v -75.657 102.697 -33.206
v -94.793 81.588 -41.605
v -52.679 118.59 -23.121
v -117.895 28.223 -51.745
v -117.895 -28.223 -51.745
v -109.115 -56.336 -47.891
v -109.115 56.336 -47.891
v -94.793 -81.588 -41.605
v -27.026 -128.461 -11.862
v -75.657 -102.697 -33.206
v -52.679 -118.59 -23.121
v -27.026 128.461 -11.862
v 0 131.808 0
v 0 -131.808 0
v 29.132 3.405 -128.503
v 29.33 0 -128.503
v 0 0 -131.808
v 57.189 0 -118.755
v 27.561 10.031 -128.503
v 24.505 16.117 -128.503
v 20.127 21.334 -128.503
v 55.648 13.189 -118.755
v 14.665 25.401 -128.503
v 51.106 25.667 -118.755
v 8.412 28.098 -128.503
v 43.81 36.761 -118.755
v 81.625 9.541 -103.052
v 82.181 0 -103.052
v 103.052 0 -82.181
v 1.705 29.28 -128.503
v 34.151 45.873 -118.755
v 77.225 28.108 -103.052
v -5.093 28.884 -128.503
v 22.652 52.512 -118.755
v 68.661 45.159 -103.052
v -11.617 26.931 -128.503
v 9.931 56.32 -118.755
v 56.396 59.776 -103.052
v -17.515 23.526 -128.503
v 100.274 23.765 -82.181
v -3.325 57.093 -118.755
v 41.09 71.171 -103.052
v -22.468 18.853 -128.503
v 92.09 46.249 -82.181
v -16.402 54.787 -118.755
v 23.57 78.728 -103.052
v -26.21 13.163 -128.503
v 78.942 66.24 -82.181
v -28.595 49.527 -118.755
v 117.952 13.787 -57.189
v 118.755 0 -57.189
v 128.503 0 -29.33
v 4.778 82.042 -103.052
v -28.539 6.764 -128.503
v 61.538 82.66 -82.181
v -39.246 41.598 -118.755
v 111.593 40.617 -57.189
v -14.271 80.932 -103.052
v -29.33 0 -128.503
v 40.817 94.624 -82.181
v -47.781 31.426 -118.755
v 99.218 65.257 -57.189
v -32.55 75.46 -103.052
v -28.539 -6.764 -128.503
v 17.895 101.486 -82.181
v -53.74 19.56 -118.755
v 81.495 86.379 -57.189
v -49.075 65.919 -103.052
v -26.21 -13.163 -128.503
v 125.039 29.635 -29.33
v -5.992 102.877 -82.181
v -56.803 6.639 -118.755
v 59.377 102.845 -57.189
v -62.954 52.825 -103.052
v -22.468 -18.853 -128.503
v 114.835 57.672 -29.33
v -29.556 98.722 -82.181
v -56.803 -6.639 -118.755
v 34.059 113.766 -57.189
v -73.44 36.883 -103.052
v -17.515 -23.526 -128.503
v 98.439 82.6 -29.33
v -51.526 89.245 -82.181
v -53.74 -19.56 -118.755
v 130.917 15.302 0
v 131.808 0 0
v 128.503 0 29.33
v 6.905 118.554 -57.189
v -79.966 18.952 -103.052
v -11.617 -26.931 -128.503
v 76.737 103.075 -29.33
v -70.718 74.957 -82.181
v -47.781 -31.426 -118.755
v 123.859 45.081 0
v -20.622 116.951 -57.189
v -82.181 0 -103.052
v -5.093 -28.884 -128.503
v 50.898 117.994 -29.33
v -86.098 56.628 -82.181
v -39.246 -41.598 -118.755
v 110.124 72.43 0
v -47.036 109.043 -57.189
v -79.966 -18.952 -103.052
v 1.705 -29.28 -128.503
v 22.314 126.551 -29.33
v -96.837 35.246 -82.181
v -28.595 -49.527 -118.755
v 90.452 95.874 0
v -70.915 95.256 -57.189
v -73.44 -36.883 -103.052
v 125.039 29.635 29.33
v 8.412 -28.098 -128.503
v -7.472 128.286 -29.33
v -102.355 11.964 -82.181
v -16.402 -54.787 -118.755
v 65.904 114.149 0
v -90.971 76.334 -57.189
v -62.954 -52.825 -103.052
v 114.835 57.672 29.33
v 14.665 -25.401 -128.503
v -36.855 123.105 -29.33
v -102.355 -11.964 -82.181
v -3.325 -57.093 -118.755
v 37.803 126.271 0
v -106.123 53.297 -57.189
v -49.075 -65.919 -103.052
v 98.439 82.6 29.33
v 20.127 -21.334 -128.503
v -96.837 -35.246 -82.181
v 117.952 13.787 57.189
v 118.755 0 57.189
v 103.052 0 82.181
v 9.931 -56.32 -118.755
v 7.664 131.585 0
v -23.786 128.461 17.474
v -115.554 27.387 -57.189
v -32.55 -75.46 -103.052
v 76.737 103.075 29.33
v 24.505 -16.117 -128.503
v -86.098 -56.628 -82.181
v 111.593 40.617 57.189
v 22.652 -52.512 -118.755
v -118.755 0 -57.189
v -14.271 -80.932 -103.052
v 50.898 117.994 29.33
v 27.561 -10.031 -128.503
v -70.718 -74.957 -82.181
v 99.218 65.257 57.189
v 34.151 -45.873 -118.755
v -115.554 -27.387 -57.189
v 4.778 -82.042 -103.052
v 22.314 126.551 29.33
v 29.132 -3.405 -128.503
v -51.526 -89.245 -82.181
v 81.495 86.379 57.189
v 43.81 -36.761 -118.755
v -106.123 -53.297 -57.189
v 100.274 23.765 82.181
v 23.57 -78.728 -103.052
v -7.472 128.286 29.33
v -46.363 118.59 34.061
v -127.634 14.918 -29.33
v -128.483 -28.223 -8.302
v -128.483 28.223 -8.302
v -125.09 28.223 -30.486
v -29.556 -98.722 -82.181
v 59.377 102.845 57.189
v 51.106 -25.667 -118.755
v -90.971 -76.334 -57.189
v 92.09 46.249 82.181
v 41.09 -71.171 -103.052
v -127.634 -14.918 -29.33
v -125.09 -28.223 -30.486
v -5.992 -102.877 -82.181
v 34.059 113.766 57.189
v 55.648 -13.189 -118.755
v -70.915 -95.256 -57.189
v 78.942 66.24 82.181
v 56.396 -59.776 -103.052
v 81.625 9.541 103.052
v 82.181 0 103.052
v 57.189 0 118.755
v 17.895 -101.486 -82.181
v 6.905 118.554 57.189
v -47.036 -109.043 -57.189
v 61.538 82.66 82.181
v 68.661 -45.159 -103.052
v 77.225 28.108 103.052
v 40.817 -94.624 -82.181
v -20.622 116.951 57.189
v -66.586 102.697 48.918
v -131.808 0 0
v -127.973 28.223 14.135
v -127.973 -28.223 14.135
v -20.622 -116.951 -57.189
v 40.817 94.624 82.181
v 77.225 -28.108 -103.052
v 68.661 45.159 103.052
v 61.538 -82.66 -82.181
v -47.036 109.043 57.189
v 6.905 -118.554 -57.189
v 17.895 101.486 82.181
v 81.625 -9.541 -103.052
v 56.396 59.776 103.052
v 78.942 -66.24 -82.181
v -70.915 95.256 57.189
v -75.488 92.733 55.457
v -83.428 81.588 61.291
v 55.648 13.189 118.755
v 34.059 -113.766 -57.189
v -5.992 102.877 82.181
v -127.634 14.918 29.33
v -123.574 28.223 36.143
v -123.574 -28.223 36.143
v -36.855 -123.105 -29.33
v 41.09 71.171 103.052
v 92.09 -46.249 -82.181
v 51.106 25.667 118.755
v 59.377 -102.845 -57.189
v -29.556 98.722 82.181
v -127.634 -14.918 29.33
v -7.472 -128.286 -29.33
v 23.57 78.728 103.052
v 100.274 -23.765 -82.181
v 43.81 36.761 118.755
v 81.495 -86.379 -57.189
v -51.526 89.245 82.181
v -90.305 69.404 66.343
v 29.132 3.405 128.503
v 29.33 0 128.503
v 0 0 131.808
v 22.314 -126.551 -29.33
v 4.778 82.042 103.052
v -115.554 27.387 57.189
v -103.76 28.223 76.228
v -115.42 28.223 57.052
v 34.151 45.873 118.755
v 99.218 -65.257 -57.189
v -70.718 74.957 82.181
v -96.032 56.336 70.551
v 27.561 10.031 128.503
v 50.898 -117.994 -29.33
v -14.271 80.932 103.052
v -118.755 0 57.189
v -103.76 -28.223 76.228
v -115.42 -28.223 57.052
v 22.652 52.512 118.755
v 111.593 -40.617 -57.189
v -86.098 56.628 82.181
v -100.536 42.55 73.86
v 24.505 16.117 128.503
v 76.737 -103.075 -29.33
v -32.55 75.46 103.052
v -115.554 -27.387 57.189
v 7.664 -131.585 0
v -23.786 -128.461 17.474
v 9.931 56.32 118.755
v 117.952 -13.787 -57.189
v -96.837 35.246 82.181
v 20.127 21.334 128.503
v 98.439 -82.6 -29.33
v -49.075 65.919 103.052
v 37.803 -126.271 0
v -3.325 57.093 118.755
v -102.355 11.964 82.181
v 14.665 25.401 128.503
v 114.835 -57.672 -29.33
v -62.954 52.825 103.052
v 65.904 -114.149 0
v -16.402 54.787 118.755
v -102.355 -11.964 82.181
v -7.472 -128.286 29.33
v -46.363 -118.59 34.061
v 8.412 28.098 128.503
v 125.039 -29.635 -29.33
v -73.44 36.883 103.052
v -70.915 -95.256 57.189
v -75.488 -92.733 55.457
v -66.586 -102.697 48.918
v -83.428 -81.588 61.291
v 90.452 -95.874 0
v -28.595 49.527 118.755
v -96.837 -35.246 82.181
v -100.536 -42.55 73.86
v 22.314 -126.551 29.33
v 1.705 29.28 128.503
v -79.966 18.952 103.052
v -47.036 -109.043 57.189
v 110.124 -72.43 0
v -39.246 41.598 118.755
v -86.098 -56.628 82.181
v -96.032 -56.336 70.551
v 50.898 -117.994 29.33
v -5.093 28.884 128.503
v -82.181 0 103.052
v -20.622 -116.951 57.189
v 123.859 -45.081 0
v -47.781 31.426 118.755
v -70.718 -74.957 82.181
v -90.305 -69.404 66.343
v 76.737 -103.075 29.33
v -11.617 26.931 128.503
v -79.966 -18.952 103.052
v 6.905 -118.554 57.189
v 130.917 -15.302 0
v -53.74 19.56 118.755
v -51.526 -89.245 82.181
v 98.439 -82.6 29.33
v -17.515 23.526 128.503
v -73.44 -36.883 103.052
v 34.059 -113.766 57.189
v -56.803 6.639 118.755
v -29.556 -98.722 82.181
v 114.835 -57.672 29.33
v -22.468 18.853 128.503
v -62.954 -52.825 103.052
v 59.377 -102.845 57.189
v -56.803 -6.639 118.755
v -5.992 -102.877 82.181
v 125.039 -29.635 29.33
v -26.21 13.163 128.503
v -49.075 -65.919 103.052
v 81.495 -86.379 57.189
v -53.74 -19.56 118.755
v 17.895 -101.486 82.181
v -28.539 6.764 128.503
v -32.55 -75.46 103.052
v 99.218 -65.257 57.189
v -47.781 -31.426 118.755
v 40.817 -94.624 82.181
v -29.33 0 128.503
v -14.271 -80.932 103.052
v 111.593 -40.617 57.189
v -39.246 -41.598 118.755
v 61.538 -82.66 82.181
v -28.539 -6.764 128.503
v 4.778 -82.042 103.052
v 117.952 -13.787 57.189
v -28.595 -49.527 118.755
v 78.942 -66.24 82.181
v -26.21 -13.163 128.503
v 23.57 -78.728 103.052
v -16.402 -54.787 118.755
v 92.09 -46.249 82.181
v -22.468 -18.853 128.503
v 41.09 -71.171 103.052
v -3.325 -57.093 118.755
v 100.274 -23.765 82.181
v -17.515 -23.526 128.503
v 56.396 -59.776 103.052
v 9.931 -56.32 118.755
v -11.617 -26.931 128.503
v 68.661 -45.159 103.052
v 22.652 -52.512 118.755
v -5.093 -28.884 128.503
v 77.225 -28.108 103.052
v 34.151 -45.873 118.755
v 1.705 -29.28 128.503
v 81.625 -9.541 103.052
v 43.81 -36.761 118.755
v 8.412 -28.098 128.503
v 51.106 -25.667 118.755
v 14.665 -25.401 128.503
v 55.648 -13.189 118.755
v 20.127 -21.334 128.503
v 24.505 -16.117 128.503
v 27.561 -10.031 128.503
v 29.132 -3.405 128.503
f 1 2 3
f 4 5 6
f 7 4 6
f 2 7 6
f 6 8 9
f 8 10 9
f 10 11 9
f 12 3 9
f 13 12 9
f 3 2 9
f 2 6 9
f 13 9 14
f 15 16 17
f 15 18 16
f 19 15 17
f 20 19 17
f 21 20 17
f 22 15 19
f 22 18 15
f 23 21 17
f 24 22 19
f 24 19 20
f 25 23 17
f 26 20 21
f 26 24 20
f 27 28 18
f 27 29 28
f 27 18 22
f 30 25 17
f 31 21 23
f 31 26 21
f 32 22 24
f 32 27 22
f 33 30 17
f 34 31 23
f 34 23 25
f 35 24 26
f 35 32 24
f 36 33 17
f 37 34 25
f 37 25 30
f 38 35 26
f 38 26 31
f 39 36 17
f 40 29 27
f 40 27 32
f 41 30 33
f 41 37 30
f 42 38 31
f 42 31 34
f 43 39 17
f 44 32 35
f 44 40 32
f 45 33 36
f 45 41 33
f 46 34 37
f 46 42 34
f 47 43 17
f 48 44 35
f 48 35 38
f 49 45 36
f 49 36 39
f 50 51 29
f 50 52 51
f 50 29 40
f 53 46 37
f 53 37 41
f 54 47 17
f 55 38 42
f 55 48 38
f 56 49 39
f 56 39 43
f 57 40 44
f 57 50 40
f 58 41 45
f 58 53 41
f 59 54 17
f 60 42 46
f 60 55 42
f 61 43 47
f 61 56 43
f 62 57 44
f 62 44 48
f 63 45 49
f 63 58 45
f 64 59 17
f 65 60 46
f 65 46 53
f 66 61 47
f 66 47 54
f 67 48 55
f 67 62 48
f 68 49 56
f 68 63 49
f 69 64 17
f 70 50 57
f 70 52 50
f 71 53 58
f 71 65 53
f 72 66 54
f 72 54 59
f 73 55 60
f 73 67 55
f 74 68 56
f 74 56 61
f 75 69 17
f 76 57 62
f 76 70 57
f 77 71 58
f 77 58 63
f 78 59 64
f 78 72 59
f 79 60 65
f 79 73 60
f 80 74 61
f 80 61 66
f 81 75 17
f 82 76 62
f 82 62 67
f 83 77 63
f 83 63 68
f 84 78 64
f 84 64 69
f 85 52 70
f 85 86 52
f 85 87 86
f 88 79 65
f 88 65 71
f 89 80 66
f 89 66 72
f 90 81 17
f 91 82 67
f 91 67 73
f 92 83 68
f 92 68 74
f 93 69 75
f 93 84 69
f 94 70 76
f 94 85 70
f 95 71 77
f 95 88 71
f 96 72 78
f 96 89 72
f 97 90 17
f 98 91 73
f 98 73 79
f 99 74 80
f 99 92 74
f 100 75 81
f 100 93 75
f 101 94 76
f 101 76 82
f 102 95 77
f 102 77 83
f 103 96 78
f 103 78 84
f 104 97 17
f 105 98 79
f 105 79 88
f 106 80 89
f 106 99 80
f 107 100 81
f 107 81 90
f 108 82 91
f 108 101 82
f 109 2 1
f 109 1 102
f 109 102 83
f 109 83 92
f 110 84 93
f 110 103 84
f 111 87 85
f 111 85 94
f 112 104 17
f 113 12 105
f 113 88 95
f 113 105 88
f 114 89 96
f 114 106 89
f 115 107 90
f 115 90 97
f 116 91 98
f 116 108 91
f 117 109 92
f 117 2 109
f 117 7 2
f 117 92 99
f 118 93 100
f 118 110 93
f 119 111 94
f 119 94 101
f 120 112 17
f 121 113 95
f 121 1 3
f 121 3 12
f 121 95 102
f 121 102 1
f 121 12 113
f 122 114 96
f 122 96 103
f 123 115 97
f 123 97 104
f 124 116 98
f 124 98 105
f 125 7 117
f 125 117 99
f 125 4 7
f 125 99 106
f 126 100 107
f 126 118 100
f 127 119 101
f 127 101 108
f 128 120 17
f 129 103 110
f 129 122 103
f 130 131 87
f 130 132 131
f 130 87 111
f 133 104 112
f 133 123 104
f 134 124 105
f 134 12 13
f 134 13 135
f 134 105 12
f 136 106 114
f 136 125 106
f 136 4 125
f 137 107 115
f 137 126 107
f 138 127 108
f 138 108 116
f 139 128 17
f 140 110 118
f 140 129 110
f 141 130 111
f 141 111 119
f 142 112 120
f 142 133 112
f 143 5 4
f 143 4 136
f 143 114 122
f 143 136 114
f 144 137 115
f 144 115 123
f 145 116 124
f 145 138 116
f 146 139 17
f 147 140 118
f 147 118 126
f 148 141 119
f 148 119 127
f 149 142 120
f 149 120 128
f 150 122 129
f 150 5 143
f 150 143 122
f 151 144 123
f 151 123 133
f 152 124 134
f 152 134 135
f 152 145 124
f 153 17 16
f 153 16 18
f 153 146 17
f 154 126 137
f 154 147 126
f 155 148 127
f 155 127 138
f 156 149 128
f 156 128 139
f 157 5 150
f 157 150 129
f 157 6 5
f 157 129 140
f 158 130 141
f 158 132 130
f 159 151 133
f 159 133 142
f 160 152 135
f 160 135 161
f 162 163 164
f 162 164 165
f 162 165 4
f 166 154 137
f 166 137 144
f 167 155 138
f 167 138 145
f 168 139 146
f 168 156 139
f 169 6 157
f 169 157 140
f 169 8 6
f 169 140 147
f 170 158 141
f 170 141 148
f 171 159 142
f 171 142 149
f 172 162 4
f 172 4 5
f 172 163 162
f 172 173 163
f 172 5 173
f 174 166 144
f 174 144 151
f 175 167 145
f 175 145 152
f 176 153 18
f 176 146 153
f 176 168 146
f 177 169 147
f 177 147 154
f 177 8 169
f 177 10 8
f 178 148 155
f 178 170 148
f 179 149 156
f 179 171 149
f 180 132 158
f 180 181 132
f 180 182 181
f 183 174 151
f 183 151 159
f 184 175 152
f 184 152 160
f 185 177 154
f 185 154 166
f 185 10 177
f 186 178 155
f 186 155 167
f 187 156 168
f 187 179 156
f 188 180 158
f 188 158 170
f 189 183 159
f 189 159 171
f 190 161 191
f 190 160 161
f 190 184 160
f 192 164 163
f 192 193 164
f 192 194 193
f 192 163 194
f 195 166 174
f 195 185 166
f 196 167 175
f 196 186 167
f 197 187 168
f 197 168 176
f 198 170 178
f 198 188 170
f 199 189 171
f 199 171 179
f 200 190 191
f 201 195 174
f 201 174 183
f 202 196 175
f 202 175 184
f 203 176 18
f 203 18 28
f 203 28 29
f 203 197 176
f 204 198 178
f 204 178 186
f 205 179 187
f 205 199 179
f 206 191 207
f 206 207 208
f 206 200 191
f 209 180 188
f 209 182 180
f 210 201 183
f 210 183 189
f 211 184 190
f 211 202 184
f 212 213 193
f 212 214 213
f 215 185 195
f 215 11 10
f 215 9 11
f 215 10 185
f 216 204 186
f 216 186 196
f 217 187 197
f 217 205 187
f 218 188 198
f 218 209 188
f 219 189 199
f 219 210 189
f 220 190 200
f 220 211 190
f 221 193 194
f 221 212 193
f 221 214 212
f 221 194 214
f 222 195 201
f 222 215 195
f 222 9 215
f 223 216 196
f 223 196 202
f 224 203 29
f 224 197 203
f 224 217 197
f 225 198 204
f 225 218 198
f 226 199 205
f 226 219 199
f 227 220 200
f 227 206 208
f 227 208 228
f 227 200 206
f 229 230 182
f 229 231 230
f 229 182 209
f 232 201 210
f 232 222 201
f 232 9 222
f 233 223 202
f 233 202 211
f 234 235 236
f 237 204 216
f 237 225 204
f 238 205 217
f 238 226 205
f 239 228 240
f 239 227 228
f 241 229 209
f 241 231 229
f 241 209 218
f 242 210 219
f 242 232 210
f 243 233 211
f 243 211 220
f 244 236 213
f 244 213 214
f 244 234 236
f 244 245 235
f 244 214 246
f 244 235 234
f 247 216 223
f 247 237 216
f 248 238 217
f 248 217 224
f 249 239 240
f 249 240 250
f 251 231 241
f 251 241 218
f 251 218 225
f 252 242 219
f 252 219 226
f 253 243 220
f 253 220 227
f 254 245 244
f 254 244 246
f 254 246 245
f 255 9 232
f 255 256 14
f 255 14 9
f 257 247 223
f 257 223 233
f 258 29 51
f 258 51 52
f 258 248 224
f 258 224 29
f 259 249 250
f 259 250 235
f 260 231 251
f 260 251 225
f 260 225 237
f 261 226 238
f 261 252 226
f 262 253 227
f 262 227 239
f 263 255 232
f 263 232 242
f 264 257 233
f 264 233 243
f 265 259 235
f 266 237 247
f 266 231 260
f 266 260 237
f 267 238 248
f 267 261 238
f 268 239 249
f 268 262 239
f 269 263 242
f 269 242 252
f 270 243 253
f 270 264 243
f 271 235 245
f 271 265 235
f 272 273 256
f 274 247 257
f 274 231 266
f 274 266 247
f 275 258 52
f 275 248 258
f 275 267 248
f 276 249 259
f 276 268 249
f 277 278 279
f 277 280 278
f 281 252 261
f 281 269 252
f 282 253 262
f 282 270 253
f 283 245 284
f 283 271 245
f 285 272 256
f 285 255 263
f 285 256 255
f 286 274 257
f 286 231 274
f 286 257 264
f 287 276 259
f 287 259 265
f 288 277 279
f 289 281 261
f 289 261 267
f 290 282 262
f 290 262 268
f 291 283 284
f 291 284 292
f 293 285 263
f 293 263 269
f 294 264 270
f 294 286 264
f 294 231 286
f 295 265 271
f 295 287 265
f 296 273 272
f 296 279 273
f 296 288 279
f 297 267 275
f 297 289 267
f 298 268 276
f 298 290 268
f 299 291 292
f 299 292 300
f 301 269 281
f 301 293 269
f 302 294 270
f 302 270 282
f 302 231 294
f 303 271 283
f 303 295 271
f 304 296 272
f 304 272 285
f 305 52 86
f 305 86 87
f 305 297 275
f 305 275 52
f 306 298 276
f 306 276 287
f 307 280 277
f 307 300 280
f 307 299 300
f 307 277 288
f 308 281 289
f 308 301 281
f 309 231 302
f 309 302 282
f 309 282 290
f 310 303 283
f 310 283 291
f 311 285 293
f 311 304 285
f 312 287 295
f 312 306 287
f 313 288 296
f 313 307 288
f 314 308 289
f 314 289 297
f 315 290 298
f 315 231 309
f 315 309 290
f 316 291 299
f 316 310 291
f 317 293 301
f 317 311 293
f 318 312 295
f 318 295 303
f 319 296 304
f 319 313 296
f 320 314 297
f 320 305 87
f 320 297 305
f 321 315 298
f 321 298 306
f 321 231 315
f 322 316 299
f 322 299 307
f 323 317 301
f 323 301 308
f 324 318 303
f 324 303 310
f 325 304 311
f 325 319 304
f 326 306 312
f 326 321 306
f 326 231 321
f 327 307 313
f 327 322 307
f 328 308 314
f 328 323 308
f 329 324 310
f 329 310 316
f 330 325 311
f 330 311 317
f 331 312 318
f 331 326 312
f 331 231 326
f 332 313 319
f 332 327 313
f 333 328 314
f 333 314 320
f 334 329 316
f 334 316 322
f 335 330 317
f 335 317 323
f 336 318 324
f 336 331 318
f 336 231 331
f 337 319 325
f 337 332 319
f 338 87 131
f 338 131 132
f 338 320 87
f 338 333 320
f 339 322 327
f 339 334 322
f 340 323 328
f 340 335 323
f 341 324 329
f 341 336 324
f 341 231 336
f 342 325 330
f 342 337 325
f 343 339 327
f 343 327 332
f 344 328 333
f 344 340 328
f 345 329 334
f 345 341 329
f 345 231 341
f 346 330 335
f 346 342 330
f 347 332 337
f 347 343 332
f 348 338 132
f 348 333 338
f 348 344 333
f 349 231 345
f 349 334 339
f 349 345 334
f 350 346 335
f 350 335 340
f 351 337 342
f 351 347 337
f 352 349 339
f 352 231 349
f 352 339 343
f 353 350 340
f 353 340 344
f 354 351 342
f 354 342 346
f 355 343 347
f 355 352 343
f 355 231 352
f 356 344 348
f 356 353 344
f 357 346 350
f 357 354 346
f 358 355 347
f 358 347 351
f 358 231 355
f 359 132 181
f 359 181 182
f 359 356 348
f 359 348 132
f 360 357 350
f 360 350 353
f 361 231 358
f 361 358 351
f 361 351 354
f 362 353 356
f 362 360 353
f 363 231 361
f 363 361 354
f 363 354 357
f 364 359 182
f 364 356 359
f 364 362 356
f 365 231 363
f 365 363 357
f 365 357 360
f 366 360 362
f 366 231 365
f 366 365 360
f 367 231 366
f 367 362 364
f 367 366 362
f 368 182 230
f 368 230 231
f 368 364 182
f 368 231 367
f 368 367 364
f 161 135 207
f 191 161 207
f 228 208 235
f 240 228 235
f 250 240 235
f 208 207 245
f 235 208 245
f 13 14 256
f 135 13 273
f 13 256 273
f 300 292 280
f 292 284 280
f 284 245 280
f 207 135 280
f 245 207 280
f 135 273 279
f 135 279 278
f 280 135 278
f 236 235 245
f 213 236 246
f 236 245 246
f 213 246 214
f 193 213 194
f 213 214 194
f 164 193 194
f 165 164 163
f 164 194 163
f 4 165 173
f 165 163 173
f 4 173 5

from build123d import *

# Parameters (mm, degrees)
F3_DEPTH = 233.68
F4_DEPTH = 241.3


with BuildPart() as f1:
    # F0 (on Front) → F1 (revolve)
    with BuildSketch(Plane.XZ):
        with BuildLine():
            Line((0, 131.807907), (0, -131.807907))
            ThreePointArc((0, -131.807907), (131.807907, 0), (0, 131.807907))
        make_face()
    revolve(axis=Axis((0, 0, 0), (0, 0, 1)))

    # F2 (on Front) → F3 (cut)
    with BuildSketch(Plane.XZ):
        with BuildLine():
            Line((-127.972643, 14.135387), (0, 0))
            Line((0, 0), (-103.759866, 76.227926))
            ThreePointArc((-103.759866, 76.227926), (-119.953573, 46.775493), (-127.972643, 14.135387))
        make_face()
        with BuildLine():
            Line((-117.895253, -51.744717), (0, 0))
            Line((0, 0), (-127.972643, 14.135387))
            ThreePointArc((-127.972643, 14.135387), (-127.270588, -19.468022), (-117.895253, -51.744717))
        make_face()
    extrude(amount=-F3_DEPTH, mode=Mode.SUBTRACT)

    # F2 (on Front) → F4 (cut)
    with BuildSketch(Plane.XZ):
        with BuildLine():
            Line((-127.972643, 14.135387), (0, 0))
            Line((0, 0), (-103.759866, 76.227926))
            ThreePointArc((-103.759866, 76.227926), (-119.953573, 46.775493), (-127.972643, 14.135387))
        make_face()
        with BuildLine():
            Line((-117.895253, -51.744717), (0, 0))
            Line((0, 0), (-127.972643, 14.135387))
            ThreePointArc((-127.972643, 14.135387), (-127.270588, -19.468022), (-117.895253, -51.744717))
        make_face()
    extrude(amount=F4_DEPTH, mode=Mode.SUBTRACT)


solid = f1.part
